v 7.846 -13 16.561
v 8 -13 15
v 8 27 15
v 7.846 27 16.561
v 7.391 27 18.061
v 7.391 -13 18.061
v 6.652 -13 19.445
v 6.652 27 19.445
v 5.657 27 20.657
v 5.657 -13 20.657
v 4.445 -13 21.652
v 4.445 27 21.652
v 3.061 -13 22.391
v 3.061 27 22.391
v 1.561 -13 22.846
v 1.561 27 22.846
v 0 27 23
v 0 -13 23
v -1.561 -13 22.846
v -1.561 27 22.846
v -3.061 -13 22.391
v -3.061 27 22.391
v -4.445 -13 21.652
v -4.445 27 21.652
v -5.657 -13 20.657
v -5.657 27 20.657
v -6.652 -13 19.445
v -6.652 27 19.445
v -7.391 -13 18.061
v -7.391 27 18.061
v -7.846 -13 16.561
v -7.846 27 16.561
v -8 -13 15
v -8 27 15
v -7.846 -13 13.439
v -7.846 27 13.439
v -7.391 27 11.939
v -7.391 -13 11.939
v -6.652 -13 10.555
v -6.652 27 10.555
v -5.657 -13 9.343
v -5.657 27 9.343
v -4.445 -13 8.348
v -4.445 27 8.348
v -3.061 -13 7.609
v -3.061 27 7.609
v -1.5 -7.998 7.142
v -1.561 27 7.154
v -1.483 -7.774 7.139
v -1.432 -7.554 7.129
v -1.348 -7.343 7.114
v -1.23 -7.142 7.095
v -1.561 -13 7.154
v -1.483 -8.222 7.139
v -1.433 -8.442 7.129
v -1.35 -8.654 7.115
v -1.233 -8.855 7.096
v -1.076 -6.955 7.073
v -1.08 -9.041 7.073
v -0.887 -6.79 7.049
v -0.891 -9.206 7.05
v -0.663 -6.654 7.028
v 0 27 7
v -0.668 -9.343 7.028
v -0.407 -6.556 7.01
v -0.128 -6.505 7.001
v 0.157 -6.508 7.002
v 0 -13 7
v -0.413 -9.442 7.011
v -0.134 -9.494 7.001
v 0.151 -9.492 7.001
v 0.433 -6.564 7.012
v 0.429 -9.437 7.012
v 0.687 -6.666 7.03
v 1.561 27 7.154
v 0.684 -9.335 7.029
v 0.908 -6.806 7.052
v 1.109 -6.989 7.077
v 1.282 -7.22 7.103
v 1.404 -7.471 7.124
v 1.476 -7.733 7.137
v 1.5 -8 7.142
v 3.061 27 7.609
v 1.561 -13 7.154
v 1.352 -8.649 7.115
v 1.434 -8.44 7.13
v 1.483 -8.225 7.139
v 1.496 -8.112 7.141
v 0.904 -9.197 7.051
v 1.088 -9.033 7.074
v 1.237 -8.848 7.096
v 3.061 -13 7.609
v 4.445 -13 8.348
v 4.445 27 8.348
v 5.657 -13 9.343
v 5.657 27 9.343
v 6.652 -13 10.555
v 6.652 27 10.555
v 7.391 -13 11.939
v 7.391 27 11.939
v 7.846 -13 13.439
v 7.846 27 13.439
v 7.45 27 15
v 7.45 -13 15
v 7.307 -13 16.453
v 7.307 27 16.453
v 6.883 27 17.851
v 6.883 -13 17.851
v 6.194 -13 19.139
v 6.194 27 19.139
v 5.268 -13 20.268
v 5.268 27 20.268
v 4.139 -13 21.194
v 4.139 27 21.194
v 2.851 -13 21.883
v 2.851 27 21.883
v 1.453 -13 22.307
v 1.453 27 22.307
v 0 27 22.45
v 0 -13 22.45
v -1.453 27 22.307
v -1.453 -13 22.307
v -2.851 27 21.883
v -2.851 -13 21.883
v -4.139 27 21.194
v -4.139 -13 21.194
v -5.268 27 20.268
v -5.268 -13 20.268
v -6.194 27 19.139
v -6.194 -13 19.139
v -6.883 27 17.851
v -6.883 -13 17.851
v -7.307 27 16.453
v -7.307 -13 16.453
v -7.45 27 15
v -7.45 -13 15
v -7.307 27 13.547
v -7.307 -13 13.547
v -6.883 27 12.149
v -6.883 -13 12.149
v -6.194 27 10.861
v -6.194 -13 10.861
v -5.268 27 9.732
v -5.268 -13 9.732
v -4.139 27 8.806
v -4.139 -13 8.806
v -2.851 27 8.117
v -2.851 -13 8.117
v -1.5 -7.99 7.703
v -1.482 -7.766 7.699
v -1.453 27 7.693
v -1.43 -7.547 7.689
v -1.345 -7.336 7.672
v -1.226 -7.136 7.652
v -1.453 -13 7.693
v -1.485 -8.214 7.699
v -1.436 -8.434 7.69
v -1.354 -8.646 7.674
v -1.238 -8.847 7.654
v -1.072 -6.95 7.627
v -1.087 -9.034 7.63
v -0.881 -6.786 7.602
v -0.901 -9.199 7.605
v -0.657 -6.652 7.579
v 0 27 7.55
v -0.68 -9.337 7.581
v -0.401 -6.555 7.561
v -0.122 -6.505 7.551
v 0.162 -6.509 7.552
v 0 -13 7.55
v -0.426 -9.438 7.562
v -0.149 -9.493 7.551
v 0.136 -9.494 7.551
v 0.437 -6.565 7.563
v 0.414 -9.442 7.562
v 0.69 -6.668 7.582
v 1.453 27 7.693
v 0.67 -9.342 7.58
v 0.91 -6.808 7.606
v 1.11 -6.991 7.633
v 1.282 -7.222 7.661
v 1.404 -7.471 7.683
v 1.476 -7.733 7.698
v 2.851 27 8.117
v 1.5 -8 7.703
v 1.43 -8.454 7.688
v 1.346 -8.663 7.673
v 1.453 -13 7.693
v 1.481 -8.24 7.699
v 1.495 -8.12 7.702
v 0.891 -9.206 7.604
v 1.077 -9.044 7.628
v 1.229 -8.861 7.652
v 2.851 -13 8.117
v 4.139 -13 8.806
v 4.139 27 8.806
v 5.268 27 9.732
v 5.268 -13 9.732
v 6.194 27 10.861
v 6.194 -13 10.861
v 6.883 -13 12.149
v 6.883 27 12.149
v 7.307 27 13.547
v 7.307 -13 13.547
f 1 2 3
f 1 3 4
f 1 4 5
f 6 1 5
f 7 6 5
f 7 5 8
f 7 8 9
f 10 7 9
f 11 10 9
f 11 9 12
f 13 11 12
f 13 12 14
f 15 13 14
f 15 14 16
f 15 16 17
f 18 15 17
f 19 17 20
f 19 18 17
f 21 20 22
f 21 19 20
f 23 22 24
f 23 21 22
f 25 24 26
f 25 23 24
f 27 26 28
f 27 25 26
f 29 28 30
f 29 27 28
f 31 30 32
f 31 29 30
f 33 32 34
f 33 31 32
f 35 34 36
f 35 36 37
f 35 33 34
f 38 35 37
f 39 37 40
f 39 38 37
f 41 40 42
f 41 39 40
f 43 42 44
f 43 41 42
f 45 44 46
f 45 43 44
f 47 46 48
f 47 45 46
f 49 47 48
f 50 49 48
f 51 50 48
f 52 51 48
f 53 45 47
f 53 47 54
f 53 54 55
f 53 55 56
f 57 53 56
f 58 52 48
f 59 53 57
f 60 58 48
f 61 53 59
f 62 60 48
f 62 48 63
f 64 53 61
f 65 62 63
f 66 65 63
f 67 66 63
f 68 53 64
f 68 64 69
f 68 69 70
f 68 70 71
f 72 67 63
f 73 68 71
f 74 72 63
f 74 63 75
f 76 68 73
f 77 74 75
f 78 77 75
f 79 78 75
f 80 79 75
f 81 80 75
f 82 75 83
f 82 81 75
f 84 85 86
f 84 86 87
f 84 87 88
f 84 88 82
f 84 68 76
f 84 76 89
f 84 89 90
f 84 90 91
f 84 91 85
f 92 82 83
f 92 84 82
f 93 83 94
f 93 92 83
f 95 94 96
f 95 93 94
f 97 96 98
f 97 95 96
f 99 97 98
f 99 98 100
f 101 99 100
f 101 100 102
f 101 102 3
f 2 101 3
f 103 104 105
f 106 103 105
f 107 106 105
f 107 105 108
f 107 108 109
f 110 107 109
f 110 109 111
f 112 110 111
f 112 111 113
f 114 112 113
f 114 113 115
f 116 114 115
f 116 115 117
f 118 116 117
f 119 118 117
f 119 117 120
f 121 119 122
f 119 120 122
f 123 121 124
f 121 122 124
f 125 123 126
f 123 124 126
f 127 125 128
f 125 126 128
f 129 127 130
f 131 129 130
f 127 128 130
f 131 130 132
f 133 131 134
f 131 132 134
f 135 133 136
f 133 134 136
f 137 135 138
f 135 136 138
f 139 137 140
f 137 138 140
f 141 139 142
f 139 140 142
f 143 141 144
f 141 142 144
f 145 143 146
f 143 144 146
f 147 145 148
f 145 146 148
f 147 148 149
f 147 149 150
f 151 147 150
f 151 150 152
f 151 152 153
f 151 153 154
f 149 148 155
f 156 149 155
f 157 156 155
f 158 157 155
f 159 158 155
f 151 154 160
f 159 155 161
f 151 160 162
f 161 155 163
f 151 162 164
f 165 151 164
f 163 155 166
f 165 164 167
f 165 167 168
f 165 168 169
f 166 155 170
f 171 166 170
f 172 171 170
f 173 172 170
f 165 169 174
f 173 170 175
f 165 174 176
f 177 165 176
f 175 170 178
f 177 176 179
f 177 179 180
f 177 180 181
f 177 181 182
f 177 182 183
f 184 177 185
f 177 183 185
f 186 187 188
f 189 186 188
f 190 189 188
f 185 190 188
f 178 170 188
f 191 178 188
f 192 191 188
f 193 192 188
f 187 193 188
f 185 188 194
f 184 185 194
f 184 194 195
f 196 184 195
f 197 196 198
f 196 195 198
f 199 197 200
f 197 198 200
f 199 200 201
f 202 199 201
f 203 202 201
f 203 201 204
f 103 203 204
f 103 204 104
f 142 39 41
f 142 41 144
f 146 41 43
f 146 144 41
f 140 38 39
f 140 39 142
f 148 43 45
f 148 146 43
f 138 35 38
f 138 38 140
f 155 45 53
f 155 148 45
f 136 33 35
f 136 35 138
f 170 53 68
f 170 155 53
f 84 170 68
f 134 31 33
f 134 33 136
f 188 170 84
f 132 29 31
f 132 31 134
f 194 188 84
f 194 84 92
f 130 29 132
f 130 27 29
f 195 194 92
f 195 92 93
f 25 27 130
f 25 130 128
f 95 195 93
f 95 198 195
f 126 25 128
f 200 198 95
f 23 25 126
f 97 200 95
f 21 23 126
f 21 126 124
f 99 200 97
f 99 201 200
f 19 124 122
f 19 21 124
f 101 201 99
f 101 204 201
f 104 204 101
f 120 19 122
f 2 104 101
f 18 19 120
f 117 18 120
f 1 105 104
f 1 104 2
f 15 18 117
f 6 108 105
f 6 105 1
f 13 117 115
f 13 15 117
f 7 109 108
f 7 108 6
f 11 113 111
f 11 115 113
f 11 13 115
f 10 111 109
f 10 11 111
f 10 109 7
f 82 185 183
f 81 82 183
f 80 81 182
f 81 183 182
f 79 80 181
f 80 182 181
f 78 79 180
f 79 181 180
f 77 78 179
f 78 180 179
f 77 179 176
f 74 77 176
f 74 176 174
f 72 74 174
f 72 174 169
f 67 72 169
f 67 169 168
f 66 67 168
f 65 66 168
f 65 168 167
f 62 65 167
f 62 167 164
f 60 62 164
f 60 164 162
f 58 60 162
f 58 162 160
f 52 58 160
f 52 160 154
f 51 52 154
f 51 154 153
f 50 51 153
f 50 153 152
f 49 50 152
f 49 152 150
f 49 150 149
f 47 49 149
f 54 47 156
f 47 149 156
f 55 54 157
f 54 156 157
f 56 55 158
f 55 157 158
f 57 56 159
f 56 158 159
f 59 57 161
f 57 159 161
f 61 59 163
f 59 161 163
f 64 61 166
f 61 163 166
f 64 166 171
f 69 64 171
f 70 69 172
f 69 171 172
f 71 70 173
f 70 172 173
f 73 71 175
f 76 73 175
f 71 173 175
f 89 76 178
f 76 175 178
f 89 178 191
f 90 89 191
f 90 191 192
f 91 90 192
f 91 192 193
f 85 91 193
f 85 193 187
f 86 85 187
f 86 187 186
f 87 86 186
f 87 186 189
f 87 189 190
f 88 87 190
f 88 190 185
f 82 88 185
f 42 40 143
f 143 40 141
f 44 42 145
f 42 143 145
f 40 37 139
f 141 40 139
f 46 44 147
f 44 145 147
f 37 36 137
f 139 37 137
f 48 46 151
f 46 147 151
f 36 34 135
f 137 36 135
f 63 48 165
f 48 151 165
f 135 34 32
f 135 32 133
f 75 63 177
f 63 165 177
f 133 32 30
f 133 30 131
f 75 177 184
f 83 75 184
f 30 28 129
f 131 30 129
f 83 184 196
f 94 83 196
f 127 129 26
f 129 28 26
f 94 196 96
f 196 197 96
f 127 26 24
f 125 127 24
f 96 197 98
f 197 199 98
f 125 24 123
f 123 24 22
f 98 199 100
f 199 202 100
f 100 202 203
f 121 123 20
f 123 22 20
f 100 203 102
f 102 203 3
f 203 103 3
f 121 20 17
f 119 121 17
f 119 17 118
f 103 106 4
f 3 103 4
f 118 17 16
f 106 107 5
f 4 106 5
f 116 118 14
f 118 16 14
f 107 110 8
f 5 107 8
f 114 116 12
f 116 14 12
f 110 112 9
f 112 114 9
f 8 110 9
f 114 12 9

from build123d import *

# Parameters (mm, degrees)
SKETCH003_R     = 8
PAD003_DEPTH    = 40
SKETCH004_R     = 1.5
POCKET_DEPTH    = 5
SKETCH005_R     = 7.45
POCKET001_DEPTH = 40.001


with BuildPart() as part:
    # Sketch003 → Pad003 (new body)
    with BuildSketch(Plane.XZ):
        with Locations((0, 15)):
            Circle(SKETCH003_R)
    extrude(amount=-PAD003_DEPTH)

    # Sketch004 (on DatumPlane) → Pocket (cut)
    with BuildSketch(Plane.XY.offset(10)):
        with Locations((0, 5)):
            Circle(SKETCH004_R)
    extrude(amount=-POCKET_DEPTH, mode=Mode.SUBTRACT)

    # Sketch005 → Pocket001 (cut, through all)
    with BuildSketch(Plane.XZ):
        with Locations((0, 15)):
            Circle(SKETCH005_R)
    extrude(amount=-POCKET001_DEPTH, mode=Mode.SUBTRACT)


with BuildPart() as part_1:
    # Body003 placement: moved
    add(part.part.moved(Location((0, -13, 0))))


solid = part_1.part
